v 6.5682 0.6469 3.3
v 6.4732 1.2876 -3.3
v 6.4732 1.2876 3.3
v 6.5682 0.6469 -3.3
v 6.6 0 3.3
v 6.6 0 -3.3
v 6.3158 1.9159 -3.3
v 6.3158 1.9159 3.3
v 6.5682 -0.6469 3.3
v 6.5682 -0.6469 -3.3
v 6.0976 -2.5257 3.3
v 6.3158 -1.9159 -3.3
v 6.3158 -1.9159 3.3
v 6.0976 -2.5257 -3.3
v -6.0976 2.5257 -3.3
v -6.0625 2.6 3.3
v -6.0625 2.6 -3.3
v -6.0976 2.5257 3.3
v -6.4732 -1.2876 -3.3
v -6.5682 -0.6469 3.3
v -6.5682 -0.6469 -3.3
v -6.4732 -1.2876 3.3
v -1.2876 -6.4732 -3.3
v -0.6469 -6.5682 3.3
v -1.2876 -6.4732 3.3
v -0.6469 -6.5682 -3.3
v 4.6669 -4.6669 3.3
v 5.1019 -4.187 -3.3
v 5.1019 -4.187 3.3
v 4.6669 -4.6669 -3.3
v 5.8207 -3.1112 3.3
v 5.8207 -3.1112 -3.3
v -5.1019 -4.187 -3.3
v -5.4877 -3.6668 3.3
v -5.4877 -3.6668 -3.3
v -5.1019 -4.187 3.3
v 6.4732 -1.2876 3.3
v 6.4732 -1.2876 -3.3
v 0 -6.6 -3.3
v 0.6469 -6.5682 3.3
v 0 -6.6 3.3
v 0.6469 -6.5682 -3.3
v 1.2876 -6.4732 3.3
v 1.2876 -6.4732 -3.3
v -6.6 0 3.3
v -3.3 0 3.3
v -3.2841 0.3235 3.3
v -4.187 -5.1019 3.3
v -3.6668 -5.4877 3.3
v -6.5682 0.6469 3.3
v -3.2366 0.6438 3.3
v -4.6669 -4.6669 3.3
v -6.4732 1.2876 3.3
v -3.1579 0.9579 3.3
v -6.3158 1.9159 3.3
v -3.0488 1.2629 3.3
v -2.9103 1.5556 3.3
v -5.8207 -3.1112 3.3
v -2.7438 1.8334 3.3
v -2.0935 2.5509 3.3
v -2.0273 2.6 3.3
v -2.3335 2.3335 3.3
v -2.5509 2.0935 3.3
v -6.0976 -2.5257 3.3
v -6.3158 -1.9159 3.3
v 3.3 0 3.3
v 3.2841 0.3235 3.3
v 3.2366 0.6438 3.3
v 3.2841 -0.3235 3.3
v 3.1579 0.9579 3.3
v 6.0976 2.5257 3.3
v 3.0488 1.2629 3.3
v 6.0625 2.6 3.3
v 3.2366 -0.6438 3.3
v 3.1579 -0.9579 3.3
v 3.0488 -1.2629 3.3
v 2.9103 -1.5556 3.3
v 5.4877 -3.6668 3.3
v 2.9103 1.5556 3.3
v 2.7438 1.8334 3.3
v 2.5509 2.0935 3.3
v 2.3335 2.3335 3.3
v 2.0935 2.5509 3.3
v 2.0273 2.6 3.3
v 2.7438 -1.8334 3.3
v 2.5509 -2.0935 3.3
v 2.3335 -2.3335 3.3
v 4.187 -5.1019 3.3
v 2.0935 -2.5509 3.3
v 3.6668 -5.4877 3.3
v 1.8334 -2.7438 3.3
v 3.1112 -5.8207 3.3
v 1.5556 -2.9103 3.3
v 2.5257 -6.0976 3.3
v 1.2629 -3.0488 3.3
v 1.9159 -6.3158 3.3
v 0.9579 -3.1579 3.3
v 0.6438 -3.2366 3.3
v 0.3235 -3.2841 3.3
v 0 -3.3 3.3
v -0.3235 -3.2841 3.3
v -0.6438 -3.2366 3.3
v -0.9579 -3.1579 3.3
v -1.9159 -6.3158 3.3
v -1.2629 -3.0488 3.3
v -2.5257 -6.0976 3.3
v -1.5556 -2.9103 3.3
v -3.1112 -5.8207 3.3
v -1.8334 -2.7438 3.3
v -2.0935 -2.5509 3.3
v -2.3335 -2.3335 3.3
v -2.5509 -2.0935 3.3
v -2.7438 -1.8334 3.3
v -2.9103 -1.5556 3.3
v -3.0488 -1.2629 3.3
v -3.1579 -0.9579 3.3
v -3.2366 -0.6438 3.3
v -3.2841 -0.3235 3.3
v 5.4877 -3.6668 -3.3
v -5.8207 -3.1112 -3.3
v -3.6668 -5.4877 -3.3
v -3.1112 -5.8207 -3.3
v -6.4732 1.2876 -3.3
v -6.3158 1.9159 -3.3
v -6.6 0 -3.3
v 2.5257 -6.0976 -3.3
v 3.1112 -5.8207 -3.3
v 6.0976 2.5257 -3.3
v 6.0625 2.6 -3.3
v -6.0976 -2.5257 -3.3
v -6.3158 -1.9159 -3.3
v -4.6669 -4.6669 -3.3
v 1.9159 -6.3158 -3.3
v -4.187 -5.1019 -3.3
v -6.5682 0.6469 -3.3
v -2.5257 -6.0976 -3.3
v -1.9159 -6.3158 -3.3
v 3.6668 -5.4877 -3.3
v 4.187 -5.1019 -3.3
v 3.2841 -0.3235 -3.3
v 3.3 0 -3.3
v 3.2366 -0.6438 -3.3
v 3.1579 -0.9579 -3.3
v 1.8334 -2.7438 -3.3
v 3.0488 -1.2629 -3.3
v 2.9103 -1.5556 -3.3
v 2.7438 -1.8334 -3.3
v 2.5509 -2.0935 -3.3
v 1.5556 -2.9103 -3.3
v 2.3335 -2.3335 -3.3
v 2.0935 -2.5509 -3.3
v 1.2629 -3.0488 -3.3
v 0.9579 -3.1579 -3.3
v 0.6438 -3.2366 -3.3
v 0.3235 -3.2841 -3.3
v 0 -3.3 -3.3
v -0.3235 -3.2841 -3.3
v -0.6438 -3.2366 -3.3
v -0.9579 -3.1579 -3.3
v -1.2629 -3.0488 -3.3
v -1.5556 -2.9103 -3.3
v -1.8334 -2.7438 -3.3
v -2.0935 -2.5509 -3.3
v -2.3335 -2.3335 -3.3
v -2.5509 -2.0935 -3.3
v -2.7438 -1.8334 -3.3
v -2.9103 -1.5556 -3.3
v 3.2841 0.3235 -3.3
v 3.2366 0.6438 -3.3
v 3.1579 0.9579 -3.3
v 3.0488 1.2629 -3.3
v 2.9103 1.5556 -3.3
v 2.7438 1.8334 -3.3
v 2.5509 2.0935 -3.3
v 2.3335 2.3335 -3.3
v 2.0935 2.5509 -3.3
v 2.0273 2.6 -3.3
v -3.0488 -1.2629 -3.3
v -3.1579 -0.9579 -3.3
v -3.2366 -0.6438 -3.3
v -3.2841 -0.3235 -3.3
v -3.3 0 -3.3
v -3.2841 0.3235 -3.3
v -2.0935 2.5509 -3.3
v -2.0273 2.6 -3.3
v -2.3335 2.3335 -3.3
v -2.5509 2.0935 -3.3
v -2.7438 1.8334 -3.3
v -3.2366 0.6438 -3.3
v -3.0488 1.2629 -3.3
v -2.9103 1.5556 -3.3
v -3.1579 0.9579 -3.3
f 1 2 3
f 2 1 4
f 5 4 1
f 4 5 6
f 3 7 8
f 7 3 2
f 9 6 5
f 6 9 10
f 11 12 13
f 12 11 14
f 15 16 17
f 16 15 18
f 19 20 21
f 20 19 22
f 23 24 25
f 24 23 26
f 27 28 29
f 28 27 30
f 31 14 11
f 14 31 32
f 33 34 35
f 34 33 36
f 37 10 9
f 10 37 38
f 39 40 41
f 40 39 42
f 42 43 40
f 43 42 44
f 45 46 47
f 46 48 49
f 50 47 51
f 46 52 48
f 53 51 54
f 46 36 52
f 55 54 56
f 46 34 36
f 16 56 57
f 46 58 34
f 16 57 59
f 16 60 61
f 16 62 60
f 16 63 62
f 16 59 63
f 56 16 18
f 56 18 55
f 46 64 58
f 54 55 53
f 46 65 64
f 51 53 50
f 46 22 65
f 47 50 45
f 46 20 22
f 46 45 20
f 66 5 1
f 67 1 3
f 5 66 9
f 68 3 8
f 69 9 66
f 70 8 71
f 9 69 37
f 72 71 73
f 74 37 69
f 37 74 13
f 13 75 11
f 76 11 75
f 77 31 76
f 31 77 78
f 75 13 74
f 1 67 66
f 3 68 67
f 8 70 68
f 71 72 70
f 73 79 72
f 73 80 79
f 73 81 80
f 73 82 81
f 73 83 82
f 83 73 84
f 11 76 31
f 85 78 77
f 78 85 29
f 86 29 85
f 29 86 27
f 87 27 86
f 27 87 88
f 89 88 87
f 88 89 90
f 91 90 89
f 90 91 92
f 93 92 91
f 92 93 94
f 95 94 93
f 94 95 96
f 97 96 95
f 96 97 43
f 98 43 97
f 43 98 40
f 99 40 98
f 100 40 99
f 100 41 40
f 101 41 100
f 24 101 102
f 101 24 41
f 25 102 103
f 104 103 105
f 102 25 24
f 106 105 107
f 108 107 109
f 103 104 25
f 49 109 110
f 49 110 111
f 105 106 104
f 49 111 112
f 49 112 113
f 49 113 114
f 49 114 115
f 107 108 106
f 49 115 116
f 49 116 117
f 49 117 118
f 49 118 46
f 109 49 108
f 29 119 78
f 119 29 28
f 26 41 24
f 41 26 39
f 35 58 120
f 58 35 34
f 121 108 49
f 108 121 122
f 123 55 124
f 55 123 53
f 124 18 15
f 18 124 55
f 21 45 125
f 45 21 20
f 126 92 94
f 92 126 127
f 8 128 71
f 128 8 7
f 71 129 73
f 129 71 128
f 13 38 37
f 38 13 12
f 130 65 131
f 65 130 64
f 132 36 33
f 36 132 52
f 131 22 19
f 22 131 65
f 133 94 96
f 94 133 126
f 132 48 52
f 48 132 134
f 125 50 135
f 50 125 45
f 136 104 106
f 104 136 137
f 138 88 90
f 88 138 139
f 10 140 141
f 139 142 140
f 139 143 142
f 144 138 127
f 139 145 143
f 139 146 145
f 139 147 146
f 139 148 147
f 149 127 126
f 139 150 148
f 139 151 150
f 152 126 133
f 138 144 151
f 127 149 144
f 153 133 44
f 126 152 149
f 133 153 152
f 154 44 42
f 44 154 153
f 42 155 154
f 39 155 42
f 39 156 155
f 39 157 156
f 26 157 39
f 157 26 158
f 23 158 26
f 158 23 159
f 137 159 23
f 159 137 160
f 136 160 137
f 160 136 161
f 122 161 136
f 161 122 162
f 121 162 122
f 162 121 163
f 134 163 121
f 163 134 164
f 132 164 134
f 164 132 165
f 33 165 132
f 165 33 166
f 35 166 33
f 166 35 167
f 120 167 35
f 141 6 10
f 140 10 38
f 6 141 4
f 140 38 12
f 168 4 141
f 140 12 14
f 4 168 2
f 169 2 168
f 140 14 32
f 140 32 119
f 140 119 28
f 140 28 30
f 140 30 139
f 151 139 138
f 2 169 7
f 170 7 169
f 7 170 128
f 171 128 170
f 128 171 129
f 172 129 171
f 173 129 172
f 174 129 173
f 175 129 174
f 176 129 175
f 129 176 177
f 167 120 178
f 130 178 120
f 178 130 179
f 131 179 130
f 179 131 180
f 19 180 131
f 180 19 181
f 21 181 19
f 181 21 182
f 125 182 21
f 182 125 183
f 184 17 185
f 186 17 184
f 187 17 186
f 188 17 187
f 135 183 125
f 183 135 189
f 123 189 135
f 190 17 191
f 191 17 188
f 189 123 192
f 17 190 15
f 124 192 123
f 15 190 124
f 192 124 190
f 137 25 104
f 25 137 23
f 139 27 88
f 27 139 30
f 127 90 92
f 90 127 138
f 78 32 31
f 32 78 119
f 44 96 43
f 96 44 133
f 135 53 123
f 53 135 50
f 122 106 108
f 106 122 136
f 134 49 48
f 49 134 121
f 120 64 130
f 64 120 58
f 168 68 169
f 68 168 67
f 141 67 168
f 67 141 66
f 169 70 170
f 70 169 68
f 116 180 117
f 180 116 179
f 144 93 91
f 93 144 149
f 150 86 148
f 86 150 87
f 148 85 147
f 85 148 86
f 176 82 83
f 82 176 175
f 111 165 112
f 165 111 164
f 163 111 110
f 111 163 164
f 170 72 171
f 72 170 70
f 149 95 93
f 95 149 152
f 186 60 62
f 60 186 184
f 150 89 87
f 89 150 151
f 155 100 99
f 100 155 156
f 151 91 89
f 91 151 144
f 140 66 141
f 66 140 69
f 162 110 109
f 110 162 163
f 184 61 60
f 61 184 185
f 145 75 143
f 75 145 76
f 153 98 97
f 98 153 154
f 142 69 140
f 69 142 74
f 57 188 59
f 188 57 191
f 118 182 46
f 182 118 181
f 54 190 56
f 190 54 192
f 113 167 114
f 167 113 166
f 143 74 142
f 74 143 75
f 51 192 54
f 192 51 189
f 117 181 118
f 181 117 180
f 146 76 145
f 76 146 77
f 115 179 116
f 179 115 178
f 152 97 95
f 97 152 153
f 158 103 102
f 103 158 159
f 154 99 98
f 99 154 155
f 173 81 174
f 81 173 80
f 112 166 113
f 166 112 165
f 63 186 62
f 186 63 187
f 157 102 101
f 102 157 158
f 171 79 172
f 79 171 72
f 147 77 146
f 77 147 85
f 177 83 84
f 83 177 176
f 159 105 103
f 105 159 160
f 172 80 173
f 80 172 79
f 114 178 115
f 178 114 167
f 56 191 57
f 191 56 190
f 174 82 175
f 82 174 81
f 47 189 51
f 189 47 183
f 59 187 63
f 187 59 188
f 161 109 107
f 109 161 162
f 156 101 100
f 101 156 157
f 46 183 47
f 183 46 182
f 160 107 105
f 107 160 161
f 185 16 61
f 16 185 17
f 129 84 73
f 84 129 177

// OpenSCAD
// COBRA Vertebra - T7 V13
// Height: 6.6000000000000005mm, OD: 13.200000000000001mm

$fn = 64;

difference() {
    // Outer cylinder
    cylinder(h=6.6000000000000005, d=13.200000000000001, center=true);
    
    // Inner channel
    cylinder(h=8.600000000000001, d=6.6000000000000005, center=true);

    // Solar panel cavity
    translate([0, 4.6000000000000005, 0])
    cube([50, 4, 30], center=true);

    // Pivot holes
    translate([0, 6.6000000000000005, 0.30000000000000027])
    rotate([90, 0, 0])
    cylinder(h=5.300000000000001, d=4, center=true);
    
    translate([0, 6.6000000000000005, -0.30000000000000027])
    rotate([90, 0, 0])
    cylinder(h=5.300000000000001, d=4, center=true);
}
